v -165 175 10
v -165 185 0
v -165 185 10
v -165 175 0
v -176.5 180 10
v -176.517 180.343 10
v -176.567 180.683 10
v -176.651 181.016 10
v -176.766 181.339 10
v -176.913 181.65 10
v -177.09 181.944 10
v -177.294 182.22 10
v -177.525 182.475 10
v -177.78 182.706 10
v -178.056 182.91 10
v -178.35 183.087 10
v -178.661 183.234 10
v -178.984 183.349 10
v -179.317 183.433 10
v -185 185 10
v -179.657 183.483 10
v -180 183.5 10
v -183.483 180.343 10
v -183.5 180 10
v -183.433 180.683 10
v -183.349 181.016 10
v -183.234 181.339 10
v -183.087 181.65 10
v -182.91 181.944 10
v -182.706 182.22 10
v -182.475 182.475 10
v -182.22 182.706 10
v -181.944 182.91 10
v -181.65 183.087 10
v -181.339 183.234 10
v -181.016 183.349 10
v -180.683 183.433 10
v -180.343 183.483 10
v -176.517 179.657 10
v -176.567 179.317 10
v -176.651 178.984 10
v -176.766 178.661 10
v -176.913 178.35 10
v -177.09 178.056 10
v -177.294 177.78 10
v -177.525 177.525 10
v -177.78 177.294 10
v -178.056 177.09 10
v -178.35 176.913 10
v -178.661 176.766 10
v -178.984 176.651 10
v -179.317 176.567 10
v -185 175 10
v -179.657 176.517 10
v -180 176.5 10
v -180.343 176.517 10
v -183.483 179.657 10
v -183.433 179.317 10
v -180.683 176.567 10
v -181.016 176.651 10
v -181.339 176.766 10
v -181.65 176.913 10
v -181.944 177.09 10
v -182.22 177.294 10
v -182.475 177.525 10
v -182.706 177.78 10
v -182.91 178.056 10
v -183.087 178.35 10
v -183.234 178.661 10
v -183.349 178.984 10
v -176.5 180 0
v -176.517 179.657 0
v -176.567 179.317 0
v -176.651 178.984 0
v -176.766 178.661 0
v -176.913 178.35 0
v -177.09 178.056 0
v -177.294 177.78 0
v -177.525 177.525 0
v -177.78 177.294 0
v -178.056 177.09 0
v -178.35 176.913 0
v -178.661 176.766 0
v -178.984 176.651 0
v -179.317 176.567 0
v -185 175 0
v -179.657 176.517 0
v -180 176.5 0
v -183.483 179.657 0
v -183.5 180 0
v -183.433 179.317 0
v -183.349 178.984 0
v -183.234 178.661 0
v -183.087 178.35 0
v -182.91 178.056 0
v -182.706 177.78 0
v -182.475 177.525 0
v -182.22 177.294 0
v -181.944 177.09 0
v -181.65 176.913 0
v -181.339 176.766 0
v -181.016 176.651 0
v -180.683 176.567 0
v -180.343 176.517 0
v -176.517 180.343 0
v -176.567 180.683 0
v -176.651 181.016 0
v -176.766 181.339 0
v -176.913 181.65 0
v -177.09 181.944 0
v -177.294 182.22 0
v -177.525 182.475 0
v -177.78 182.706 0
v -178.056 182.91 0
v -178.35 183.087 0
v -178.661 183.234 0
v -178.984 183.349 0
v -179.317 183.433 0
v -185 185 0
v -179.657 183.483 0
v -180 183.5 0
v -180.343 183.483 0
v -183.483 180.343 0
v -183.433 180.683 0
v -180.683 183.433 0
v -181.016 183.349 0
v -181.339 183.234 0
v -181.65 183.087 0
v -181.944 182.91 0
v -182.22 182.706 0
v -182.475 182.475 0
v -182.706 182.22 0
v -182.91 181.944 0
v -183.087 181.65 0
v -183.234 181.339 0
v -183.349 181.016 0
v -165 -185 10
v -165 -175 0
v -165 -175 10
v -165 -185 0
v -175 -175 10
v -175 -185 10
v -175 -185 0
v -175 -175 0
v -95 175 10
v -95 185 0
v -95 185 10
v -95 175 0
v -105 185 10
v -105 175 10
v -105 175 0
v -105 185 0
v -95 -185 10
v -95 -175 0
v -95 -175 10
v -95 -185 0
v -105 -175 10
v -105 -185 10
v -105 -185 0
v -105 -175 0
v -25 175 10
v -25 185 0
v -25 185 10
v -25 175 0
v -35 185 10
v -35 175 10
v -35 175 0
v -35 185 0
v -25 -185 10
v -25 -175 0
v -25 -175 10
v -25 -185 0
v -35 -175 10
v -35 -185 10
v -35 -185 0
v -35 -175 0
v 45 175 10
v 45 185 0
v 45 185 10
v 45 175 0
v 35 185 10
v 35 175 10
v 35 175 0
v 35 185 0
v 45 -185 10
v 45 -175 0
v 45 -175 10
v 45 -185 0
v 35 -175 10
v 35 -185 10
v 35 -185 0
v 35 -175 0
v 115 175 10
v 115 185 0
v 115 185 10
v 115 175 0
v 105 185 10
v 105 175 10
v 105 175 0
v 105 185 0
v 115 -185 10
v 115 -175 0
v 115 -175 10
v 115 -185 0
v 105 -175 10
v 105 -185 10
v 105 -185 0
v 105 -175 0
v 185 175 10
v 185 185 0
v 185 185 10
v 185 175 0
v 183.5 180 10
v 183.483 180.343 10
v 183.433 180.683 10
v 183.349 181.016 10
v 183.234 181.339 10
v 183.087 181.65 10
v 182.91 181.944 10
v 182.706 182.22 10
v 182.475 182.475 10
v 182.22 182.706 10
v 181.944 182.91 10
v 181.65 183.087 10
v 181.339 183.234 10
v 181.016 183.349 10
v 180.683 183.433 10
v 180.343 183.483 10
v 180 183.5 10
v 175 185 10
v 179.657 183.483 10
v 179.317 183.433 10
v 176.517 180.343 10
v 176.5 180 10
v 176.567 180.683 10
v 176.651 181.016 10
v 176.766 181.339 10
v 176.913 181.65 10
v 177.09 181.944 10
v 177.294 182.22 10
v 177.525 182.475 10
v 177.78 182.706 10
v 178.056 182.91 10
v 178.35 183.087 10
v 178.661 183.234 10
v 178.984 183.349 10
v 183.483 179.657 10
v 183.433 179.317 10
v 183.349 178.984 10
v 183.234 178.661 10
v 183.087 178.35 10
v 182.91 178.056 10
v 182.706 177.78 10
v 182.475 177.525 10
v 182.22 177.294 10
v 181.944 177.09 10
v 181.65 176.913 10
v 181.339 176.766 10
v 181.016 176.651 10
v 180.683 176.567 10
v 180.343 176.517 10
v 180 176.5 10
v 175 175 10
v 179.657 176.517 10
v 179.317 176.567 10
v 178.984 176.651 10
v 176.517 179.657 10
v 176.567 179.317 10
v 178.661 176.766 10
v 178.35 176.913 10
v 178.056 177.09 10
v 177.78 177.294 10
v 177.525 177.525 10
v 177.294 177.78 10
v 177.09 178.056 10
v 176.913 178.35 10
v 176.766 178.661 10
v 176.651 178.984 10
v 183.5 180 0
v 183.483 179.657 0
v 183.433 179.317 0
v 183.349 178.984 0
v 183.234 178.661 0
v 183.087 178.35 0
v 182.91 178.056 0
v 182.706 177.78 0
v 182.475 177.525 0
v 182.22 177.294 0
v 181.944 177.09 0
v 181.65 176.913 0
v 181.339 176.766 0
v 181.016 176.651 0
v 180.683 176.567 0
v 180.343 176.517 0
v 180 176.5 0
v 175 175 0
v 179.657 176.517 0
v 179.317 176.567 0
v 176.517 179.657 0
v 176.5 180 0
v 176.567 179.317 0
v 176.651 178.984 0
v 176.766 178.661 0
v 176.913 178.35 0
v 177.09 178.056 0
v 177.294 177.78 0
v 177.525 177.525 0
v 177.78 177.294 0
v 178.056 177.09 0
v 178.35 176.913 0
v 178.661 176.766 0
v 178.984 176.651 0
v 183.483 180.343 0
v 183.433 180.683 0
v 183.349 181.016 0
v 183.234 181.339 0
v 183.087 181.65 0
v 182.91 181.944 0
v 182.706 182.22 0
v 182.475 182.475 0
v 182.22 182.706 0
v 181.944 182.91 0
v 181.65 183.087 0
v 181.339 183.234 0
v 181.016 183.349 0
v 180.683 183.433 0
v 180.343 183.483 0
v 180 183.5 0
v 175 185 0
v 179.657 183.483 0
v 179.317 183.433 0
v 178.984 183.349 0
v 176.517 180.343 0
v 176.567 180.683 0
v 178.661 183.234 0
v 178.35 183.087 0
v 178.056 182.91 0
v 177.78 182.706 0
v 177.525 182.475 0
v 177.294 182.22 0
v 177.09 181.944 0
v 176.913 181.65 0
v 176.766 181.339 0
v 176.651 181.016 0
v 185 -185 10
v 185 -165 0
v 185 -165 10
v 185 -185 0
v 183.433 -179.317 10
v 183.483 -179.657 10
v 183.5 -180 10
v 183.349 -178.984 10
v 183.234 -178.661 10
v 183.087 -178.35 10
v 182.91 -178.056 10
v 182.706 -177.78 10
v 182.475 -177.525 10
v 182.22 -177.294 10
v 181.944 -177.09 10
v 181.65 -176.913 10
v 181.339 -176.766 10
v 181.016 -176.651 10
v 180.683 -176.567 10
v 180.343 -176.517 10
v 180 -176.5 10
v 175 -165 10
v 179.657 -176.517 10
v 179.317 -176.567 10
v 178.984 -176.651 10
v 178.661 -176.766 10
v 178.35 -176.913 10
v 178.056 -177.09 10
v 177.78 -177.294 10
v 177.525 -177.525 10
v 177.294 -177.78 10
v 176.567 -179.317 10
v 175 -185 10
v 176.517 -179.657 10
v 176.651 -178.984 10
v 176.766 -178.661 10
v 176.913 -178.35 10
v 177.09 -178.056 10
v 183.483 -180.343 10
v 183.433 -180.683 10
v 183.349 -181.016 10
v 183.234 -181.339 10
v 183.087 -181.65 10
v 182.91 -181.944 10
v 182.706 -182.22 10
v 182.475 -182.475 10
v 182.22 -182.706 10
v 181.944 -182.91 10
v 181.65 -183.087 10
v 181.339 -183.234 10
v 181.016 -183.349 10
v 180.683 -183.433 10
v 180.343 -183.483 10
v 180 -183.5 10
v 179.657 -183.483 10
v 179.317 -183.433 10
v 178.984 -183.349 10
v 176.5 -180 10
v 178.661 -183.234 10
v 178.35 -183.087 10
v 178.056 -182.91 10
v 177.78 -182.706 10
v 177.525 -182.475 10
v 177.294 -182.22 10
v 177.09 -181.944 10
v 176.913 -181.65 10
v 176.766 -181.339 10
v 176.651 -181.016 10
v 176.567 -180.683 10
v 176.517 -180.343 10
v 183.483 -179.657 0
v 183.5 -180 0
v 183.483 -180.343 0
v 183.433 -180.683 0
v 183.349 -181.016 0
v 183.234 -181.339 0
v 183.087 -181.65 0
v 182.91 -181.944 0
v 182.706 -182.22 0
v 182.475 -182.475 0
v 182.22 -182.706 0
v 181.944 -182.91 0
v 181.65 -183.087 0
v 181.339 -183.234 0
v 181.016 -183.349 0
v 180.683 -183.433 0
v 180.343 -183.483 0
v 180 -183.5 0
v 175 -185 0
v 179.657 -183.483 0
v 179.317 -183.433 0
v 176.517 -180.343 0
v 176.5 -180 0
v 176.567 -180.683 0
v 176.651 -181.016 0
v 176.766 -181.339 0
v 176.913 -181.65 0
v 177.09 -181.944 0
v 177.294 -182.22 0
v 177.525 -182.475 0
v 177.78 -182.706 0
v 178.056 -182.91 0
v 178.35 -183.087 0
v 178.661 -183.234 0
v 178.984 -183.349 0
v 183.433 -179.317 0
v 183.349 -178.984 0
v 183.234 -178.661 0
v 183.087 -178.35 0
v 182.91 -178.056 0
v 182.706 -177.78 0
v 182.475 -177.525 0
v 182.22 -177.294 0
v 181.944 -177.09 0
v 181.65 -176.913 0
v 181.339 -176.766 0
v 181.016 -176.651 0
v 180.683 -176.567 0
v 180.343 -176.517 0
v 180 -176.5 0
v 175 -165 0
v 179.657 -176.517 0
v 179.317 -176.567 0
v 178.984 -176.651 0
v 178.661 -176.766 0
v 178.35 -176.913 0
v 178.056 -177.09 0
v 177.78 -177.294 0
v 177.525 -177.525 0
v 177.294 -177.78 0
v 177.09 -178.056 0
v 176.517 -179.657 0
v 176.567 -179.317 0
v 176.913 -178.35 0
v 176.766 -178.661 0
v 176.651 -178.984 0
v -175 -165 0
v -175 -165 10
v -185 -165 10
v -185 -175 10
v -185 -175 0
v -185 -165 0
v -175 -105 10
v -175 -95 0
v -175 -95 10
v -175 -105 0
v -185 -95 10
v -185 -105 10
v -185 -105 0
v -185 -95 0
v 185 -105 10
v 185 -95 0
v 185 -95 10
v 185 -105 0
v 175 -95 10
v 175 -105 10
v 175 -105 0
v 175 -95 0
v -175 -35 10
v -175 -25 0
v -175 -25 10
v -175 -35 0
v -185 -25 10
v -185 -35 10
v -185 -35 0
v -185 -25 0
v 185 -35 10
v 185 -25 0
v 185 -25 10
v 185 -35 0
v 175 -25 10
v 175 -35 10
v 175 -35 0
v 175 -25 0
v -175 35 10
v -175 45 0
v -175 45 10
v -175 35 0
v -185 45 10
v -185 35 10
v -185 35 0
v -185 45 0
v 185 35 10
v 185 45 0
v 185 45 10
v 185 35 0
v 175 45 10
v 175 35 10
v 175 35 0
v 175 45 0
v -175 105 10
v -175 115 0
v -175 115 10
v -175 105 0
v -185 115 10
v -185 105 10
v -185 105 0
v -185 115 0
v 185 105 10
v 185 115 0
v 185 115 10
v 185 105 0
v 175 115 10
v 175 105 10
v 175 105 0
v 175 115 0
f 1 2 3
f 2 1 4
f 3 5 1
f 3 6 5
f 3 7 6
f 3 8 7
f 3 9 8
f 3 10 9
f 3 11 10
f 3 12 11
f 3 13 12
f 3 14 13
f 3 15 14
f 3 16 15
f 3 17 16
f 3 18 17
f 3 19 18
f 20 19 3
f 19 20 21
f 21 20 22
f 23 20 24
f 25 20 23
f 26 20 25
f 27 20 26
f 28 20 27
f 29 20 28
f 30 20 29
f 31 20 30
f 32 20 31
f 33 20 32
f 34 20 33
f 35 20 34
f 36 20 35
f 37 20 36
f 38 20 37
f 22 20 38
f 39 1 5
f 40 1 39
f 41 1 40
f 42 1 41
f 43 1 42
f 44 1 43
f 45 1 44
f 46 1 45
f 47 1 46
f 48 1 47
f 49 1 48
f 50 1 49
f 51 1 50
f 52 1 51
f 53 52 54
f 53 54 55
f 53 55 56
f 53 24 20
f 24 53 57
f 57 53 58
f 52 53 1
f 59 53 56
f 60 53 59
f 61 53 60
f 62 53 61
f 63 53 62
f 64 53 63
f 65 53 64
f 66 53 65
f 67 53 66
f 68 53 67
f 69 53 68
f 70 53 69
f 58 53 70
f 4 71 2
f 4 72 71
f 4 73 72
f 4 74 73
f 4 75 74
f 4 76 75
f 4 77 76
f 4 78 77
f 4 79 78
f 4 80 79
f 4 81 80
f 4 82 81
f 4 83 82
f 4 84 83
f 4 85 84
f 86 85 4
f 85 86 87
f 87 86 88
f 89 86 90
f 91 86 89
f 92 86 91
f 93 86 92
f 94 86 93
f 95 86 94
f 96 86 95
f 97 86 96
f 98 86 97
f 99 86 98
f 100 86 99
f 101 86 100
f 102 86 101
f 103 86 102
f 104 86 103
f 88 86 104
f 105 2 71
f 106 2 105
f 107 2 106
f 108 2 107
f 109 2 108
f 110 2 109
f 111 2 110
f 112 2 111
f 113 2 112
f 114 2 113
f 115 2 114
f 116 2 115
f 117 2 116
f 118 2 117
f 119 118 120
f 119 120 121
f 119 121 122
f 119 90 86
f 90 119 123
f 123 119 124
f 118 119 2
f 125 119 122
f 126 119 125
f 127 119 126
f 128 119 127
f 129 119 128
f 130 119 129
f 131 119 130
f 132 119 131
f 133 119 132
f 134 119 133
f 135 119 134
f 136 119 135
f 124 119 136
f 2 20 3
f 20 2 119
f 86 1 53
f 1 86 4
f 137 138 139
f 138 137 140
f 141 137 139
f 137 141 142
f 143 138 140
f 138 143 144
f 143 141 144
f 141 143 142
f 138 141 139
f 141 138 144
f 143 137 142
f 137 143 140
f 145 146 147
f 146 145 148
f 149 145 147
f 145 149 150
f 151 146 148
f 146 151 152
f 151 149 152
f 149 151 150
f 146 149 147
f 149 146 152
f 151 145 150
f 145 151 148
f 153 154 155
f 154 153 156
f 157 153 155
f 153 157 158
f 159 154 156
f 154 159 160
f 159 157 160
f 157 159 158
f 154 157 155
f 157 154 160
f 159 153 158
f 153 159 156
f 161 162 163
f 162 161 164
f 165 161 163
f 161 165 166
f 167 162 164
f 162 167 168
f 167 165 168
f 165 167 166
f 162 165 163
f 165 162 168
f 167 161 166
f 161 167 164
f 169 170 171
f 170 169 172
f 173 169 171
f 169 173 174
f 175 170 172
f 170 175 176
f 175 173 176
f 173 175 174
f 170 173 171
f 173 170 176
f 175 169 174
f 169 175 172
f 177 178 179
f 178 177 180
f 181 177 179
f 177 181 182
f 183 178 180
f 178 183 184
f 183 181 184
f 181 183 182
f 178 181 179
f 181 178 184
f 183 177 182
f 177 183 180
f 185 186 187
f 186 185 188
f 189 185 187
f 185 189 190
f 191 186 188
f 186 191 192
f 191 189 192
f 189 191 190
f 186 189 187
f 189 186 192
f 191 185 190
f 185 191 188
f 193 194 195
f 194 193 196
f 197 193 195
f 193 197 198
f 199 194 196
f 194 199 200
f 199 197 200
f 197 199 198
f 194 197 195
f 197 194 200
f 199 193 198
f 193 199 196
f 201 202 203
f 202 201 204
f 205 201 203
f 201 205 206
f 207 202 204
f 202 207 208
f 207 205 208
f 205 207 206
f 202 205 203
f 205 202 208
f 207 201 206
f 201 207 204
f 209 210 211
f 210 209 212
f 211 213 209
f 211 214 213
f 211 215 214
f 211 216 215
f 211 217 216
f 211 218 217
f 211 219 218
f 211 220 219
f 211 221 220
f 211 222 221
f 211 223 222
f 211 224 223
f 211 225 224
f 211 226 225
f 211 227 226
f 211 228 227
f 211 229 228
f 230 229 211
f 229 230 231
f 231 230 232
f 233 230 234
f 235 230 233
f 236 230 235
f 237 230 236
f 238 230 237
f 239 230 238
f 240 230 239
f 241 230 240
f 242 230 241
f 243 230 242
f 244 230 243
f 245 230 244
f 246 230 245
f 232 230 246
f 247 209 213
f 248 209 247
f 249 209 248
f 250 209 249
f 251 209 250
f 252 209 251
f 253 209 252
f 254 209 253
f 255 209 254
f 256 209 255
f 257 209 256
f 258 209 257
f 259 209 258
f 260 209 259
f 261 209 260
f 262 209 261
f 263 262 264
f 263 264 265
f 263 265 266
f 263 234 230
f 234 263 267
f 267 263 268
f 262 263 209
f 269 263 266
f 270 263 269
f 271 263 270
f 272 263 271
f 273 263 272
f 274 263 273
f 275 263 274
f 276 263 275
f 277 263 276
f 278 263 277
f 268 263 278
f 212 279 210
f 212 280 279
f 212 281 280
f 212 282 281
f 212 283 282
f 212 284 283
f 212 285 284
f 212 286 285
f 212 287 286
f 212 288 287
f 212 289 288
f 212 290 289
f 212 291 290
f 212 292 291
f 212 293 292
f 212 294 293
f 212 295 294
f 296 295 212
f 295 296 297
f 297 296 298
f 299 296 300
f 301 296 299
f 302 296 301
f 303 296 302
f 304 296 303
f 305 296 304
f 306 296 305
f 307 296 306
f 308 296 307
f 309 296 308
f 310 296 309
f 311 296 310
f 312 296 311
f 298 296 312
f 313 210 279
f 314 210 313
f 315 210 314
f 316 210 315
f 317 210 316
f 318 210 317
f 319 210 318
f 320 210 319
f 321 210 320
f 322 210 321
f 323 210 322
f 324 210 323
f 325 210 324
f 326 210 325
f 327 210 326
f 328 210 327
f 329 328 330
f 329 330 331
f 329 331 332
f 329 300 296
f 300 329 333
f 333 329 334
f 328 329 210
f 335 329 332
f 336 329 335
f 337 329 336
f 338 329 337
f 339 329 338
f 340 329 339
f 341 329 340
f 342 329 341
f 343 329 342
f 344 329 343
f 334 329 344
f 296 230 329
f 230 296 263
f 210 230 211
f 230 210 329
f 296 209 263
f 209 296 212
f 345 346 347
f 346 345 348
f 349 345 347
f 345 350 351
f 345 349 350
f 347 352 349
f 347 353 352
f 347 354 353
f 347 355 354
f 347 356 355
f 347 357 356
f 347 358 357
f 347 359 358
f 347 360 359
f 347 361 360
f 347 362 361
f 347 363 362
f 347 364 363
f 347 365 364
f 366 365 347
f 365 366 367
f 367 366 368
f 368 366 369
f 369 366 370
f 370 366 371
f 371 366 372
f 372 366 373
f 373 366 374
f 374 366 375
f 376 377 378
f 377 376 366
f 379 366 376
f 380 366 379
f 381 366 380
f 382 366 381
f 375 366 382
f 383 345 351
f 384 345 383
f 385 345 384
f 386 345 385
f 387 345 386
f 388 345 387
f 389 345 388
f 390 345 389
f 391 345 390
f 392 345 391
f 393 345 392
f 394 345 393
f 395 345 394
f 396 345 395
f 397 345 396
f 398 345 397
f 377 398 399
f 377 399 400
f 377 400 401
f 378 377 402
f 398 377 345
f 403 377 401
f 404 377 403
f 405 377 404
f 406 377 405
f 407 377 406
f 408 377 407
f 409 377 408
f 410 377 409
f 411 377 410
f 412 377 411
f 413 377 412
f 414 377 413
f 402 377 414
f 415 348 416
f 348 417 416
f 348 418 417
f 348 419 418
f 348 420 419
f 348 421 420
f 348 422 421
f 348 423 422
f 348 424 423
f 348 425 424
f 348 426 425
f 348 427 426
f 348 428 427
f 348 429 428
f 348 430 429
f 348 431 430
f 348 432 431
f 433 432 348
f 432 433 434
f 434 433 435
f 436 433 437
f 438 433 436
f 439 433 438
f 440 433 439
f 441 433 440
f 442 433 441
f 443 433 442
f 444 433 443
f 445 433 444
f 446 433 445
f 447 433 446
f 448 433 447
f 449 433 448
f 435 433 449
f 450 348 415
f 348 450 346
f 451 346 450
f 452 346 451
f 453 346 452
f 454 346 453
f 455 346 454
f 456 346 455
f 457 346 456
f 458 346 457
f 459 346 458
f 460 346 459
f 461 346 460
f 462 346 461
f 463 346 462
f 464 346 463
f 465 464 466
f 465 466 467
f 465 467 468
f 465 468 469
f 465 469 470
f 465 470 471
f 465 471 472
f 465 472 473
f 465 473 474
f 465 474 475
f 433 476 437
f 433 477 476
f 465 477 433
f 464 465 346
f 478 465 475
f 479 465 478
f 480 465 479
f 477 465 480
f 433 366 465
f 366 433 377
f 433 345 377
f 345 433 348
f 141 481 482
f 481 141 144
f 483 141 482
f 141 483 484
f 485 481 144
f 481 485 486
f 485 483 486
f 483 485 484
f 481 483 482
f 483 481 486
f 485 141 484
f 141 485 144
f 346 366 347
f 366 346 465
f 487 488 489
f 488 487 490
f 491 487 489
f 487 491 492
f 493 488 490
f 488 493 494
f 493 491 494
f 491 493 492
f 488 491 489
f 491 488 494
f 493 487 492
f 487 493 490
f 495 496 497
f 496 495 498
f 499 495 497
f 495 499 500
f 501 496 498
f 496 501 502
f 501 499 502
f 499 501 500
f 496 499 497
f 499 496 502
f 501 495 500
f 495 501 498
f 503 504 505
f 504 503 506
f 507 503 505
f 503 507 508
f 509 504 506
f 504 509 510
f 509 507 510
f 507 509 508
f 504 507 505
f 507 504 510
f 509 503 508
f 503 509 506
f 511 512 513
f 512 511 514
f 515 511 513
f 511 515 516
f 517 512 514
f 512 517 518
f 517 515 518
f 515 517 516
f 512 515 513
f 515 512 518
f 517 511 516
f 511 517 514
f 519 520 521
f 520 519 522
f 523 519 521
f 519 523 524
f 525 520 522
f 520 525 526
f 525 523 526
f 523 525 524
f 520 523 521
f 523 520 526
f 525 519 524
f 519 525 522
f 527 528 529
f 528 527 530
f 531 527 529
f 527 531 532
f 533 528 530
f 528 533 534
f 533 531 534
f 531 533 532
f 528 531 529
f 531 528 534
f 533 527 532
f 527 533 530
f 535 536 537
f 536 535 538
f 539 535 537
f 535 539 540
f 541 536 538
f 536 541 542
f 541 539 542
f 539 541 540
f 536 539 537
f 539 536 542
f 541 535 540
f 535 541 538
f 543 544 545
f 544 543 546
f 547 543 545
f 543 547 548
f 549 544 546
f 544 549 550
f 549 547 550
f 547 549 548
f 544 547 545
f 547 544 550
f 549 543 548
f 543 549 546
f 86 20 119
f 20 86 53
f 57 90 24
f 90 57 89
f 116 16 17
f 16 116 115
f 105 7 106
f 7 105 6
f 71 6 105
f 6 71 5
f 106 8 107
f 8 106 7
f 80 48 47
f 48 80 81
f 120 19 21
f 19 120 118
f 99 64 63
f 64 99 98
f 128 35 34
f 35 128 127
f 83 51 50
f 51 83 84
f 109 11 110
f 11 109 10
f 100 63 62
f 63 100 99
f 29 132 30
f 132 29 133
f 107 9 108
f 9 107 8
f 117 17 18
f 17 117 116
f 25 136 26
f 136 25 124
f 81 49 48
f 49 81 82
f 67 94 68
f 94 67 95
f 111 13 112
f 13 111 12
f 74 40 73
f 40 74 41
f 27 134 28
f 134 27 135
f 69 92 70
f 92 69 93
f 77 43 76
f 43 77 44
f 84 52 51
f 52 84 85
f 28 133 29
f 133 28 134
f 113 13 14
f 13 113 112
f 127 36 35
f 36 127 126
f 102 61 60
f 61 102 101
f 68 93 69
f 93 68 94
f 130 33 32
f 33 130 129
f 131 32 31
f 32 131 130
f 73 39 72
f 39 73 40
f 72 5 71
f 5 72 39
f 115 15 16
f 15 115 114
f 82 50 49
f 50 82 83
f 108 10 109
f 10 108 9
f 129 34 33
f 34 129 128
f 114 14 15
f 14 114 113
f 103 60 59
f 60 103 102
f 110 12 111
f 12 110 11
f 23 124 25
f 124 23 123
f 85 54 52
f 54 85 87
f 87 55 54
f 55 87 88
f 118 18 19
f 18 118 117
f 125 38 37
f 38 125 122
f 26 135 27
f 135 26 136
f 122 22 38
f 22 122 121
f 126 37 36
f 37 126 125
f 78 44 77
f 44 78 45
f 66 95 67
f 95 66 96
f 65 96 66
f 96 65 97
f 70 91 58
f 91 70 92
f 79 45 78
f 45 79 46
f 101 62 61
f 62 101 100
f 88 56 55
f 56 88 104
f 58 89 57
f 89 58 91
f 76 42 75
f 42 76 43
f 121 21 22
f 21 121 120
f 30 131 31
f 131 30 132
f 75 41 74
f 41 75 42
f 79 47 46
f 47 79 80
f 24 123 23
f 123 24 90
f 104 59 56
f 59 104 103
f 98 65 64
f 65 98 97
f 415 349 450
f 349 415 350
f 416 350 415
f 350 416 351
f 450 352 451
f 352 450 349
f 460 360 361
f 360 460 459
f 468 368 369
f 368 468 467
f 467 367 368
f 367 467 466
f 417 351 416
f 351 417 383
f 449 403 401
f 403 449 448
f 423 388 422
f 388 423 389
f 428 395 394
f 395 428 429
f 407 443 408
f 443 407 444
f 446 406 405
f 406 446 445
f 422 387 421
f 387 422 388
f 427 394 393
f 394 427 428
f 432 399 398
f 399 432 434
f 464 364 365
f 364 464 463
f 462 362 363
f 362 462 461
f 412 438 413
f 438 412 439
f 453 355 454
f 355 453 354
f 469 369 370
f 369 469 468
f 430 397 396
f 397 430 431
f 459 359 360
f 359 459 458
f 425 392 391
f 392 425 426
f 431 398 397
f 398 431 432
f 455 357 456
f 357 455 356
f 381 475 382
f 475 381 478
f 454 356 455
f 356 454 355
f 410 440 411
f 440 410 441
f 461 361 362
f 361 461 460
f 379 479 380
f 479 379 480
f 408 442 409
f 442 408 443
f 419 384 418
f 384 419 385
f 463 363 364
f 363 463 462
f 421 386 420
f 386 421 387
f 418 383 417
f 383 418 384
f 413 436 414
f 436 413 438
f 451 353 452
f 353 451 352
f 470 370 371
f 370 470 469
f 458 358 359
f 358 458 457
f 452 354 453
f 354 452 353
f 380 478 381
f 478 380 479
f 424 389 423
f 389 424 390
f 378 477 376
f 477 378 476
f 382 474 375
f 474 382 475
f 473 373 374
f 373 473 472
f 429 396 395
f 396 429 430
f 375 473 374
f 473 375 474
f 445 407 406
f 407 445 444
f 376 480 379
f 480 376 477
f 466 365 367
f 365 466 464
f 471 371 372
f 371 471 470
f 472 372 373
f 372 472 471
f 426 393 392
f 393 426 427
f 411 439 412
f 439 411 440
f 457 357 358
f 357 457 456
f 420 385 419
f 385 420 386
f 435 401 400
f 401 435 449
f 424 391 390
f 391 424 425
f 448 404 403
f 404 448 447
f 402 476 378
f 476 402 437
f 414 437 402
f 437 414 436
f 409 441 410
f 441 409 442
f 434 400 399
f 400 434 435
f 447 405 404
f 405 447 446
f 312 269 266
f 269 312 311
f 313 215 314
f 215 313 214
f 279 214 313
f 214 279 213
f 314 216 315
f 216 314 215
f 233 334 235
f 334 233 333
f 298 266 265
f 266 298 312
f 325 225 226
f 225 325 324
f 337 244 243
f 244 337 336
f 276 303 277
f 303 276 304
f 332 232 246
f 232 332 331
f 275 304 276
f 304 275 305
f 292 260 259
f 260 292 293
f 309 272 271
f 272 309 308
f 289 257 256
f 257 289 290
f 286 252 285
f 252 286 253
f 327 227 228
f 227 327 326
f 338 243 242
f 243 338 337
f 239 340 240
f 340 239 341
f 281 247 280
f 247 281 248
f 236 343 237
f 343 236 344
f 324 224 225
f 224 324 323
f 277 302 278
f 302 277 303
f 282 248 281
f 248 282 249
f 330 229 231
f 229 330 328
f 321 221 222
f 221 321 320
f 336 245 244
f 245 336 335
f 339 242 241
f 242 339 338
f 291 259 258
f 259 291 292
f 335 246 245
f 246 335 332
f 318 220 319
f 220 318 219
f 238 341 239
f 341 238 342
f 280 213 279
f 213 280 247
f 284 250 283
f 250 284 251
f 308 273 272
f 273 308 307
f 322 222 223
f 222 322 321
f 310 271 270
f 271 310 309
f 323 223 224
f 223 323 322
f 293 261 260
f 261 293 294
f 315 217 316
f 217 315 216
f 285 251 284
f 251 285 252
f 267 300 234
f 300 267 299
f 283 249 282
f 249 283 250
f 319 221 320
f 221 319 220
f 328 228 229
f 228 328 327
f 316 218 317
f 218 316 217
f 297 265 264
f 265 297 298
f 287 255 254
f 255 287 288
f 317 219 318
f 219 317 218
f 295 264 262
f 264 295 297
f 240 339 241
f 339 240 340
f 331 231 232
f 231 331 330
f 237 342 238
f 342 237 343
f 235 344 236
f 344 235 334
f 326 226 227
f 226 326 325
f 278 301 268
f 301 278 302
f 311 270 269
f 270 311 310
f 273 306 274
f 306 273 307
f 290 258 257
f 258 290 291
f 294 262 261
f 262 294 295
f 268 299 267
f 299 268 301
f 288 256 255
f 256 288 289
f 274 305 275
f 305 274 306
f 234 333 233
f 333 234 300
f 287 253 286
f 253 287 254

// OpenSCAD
// ring_33.scad - ring index 33 (z bottom = 330 mm)
$fn = 64; bar = 10; half_b = bar/2; outer = 370; half_outer = outer/2;
front_y = 180; back_y = -180; left_x = -180; right_x = 180;
x_centers = [-170, -100, -30, 40, 110, 180];
z_centers = [5, 85, 155, 225, 295, 365, 435, 505, 575, 645, 715]; ring_z = 330;
module place_box(cx, cy, sx, sy) { translate([cx - sx/2, cy - sy/2, 0]) cube([sx, sy, bar]); }

difference() { union() {
    for (x = x_centers) { place_box(x, front_y, bar, bar); place_box(x, back_y, bar, bar); }
    for (y = x_centers) { place_box(left_x, y, bar, bar); place_box(right_x, y, bar, bar); }
    for (zc = z_centers) if ((zc - half_b < ring_z + bar) && (zc + half_b > ring_z)) {
        translate([-half_outer, front_y - half_b, 0]) cube([outer, bar, bar]);
        translate([-half_outer, back_y - half_b, 0])  cube([outer, bar, bar]);
        translate([left_x - half_b, -half_outer, 0])  cube([bar, outer, bar]);
        translate([right_x - half_b, -half_outer, 0]) cube([bar, outer, bar]);
    }
  }
  for (cx = [-180, 180]) for (cy = [-180, 180]) translate([cx, cy, 0]) cylinder(h = bar, r = 3.5, $fn = 64);
}
